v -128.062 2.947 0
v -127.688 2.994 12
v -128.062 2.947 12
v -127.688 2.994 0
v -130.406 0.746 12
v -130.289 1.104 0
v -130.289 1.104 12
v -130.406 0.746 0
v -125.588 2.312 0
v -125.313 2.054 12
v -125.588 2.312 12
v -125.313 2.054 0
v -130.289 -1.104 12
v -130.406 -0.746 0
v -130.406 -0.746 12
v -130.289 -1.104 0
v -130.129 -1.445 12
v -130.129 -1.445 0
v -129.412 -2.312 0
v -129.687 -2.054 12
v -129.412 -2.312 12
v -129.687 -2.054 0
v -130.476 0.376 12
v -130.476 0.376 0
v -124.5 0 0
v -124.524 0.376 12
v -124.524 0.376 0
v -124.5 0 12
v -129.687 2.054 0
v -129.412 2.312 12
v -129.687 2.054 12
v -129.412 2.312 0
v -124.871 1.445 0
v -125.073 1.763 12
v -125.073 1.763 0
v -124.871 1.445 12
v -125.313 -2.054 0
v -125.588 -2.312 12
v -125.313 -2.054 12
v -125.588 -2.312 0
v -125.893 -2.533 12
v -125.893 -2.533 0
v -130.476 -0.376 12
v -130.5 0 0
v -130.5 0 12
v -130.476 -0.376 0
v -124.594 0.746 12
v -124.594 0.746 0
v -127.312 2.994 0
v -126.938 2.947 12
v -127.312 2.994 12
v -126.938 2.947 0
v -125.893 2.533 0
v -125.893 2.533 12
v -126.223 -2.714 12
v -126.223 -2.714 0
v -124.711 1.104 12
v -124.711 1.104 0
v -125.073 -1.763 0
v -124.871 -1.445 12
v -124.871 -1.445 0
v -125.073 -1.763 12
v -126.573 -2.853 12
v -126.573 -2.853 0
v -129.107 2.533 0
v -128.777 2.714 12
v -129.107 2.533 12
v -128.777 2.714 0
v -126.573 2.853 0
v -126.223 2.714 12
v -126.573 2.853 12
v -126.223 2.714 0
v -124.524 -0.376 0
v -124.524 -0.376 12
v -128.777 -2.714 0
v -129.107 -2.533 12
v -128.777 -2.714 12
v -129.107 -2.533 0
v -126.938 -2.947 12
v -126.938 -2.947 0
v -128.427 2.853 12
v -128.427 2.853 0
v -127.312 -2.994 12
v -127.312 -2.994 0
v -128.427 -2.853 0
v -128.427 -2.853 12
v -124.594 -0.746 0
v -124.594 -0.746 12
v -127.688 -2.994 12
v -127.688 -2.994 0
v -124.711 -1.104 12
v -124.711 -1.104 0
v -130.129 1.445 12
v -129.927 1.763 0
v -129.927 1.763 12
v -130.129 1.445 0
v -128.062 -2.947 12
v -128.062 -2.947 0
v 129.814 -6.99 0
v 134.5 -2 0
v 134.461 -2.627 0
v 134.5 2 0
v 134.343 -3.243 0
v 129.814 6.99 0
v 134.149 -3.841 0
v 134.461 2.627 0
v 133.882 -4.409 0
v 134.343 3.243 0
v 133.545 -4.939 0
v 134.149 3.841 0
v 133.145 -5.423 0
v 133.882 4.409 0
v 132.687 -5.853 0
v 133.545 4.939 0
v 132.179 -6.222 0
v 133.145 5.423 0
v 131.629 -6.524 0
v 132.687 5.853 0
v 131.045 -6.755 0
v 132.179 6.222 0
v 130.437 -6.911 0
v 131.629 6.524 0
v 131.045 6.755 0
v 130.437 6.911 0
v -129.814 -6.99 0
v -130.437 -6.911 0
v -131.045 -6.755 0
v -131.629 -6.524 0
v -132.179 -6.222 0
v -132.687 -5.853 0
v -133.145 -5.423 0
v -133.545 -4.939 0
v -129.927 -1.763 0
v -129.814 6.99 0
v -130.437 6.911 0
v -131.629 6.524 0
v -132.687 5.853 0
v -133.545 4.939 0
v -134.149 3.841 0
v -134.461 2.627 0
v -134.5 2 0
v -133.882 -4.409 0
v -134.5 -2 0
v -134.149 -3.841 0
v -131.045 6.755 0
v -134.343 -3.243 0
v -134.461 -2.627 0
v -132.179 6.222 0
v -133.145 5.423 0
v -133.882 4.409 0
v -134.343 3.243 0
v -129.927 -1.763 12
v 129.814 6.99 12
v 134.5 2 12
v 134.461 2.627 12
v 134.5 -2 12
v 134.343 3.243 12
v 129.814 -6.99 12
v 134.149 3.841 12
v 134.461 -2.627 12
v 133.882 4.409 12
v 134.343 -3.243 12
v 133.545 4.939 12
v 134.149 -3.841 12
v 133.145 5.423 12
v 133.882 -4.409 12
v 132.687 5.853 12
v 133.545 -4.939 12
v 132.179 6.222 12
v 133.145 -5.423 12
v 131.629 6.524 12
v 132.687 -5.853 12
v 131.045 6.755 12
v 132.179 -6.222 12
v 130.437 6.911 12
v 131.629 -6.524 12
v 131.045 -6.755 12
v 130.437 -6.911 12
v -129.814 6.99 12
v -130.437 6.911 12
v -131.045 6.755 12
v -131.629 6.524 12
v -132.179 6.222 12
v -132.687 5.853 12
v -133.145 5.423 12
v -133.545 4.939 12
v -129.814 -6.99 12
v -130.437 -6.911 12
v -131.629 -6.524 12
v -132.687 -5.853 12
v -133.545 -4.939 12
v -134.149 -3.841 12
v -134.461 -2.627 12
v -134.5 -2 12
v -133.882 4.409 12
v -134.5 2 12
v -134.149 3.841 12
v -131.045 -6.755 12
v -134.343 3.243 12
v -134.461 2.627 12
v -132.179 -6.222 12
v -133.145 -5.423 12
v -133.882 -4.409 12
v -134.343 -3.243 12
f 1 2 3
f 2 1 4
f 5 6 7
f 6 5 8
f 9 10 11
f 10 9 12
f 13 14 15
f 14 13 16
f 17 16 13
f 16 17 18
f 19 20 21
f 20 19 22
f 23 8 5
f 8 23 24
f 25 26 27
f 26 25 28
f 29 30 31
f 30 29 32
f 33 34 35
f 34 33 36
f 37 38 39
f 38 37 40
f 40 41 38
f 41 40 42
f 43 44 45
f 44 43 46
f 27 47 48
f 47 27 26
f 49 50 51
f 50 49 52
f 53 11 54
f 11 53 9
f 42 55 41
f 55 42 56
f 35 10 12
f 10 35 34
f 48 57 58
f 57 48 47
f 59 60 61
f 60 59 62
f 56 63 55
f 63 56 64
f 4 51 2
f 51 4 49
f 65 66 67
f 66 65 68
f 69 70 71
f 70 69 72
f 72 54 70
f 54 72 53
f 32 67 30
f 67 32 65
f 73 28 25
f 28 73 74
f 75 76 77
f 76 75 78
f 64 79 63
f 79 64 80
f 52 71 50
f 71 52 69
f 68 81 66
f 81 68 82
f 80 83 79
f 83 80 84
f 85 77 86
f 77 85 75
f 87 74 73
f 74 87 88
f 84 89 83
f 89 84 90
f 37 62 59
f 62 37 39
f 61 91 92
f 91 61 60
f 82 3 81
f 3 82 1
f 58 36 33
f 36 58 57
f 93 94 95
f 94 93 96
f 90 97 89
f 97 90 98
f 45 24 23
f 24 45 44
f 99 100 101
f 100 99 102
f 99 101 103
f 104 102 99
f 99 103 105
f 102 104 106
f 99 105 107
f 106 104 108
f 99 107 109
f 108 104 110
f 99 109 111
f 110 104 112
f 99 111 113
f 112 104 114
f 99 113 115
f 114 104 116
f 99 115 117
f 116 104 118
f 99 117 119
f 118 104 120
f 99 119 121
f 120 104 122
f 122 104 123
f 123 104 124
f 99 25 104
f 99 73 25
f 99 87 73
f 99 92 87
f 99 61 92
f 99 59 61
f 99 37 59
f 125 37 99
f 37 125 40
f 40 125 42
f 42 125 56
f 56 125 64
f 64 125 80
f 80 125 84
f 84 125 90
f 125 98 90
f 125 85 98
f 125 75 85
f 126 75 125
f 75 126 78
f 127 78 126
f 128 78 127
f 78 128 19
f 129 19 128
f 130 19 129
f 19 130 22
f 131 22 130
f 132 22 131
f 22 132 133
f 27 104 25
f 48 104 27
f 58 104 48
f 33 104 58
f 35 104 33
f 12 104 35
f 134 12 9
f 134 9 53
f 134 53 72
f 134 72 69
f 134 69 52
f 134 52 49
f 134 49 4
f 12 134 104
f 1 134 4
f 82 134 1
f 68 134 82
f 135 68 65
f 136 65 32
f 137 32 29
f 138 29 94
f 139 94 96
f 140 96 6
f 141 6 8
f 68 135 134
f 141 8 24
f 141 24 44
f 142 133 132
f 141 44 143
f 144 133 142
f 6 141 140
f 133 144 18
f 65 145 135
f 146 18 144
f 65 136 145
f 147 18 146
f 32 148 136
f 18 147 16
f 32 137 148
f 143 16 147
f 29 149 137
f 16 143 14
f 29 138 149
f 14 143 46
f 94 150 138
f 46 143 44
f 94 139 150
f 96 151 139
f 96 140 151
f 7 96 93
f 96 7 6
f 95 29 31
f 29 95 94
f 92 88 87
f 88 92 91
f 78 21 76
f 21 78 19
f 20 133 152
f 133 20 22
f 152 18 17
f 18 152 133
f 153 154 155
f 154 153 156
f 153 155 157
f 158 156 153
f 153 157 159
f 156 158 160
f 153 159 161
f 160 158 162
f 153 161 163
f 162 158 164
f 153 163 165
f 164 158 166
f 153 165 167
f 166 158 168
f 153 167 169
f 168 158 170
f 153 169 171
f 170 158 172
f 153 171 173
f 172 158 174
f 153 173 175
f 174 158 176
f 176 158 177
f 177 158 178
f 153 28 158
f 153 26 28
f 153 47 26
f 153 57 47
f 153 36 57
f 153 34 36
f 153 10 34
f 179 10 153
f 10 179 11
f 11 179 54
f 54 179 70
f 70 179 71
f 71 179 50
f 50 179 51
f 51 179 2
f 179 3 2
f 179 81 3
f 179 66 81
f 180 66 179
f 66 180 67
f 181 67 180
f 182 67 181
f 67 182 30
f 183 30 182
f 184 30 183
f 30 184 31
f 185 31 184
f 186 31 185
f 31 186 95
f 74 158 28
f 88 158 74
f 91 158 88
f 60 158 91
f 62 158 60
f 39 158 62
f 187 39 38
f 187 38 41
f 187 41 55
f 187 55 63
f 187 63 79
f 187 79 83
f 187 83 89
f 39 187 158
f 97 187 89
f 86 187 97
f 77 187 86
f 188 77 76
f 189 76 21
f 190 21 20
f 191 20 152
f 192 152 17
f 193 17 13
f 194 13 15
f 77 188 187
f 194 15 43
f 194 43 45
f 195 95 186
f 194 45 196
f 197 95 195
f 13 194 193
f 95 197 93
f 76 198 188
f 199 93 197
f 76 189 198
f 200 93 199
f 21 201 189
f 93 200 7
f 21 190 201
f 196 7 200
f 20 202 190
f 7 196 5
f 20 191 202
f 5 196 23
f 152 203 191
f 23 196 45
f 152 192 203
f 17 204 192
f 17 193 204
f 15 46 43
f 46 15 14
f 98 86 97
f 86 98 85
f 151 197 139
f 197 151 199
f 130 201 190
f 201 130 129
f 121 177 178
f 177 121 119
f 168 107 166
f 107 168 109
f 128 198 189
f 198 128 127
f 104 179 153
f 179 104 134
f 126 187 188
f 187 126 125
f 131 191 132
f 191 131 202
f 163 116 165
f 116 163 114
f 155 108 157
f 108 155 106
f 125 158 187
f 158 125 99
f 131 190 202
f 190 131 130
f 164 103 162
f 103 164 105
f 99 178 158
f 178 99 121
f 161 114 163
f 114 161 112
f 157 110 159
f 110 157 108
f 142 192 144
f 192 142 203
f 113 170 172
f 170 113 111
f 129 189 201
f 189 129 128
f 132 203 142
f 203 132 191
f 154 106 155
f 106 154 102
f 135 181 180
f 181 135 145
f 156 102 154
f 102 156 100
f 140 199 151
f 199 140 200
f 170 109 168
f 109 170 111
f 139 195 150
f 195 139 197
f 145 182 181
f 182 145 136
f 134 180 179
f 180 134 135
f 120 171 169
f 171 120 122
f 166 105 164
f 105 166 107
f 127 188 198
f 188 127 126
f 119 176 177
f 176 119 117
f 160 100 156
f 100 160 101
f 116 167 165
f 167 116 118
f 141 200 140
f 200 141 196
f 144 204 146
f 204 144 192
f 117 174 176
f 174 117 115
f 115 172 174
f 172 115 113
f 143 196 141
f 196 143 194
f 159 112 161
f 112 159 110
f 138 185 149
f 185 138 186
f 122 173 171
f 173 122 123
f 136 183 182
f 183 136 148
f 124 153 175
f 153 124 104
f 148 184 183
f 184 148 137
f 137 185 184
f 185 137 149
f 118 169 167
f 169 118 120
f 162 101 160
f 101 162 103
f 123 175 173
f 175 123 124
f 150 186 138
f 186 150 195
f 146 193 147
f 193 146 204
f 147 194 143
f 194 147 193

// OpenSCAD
$fn = 50;


difference() {
	union() {
		hull() {
			translate(v = [-129.5000000000, 2.0000000000, 0]) {
				cylinder(h = 12, r = 5);
			}
			translate(v = [129.5000000000, 2.0000000000, 0]) {
				cylinder(h = 12, r = 5);
			}
			translate(v = [-129.5000000000, -2.0000000000, 0]) {
				cylinder(h = 12, r = 5);
			}
			translate(v = [129.5000000000, -2.0000000000, 0]) {
				cylinder(h = 12, r = 5);
			}
		}
	}
	union() {
		translate(v = [-127.5000000000, 0.0000000000, 0]) {
			cylinder(h = 12, r = 3.0000000000);
		}
		translate(v = [-127.5000000000, 0.0000000000, 0]) {
			cylinder(h = 12, r = 1.5000000000);
		}
		translate(v = [-127.5000000000, 0.0000000000, 0]) {
			cylinder(h = 12, r = 1.5000000000);
		}
		translate(v = [-127.5000000000, 0.0000000000, 0]) {
			cylinder(h = 12, r = 1.5000000000);
		}
	}
}
